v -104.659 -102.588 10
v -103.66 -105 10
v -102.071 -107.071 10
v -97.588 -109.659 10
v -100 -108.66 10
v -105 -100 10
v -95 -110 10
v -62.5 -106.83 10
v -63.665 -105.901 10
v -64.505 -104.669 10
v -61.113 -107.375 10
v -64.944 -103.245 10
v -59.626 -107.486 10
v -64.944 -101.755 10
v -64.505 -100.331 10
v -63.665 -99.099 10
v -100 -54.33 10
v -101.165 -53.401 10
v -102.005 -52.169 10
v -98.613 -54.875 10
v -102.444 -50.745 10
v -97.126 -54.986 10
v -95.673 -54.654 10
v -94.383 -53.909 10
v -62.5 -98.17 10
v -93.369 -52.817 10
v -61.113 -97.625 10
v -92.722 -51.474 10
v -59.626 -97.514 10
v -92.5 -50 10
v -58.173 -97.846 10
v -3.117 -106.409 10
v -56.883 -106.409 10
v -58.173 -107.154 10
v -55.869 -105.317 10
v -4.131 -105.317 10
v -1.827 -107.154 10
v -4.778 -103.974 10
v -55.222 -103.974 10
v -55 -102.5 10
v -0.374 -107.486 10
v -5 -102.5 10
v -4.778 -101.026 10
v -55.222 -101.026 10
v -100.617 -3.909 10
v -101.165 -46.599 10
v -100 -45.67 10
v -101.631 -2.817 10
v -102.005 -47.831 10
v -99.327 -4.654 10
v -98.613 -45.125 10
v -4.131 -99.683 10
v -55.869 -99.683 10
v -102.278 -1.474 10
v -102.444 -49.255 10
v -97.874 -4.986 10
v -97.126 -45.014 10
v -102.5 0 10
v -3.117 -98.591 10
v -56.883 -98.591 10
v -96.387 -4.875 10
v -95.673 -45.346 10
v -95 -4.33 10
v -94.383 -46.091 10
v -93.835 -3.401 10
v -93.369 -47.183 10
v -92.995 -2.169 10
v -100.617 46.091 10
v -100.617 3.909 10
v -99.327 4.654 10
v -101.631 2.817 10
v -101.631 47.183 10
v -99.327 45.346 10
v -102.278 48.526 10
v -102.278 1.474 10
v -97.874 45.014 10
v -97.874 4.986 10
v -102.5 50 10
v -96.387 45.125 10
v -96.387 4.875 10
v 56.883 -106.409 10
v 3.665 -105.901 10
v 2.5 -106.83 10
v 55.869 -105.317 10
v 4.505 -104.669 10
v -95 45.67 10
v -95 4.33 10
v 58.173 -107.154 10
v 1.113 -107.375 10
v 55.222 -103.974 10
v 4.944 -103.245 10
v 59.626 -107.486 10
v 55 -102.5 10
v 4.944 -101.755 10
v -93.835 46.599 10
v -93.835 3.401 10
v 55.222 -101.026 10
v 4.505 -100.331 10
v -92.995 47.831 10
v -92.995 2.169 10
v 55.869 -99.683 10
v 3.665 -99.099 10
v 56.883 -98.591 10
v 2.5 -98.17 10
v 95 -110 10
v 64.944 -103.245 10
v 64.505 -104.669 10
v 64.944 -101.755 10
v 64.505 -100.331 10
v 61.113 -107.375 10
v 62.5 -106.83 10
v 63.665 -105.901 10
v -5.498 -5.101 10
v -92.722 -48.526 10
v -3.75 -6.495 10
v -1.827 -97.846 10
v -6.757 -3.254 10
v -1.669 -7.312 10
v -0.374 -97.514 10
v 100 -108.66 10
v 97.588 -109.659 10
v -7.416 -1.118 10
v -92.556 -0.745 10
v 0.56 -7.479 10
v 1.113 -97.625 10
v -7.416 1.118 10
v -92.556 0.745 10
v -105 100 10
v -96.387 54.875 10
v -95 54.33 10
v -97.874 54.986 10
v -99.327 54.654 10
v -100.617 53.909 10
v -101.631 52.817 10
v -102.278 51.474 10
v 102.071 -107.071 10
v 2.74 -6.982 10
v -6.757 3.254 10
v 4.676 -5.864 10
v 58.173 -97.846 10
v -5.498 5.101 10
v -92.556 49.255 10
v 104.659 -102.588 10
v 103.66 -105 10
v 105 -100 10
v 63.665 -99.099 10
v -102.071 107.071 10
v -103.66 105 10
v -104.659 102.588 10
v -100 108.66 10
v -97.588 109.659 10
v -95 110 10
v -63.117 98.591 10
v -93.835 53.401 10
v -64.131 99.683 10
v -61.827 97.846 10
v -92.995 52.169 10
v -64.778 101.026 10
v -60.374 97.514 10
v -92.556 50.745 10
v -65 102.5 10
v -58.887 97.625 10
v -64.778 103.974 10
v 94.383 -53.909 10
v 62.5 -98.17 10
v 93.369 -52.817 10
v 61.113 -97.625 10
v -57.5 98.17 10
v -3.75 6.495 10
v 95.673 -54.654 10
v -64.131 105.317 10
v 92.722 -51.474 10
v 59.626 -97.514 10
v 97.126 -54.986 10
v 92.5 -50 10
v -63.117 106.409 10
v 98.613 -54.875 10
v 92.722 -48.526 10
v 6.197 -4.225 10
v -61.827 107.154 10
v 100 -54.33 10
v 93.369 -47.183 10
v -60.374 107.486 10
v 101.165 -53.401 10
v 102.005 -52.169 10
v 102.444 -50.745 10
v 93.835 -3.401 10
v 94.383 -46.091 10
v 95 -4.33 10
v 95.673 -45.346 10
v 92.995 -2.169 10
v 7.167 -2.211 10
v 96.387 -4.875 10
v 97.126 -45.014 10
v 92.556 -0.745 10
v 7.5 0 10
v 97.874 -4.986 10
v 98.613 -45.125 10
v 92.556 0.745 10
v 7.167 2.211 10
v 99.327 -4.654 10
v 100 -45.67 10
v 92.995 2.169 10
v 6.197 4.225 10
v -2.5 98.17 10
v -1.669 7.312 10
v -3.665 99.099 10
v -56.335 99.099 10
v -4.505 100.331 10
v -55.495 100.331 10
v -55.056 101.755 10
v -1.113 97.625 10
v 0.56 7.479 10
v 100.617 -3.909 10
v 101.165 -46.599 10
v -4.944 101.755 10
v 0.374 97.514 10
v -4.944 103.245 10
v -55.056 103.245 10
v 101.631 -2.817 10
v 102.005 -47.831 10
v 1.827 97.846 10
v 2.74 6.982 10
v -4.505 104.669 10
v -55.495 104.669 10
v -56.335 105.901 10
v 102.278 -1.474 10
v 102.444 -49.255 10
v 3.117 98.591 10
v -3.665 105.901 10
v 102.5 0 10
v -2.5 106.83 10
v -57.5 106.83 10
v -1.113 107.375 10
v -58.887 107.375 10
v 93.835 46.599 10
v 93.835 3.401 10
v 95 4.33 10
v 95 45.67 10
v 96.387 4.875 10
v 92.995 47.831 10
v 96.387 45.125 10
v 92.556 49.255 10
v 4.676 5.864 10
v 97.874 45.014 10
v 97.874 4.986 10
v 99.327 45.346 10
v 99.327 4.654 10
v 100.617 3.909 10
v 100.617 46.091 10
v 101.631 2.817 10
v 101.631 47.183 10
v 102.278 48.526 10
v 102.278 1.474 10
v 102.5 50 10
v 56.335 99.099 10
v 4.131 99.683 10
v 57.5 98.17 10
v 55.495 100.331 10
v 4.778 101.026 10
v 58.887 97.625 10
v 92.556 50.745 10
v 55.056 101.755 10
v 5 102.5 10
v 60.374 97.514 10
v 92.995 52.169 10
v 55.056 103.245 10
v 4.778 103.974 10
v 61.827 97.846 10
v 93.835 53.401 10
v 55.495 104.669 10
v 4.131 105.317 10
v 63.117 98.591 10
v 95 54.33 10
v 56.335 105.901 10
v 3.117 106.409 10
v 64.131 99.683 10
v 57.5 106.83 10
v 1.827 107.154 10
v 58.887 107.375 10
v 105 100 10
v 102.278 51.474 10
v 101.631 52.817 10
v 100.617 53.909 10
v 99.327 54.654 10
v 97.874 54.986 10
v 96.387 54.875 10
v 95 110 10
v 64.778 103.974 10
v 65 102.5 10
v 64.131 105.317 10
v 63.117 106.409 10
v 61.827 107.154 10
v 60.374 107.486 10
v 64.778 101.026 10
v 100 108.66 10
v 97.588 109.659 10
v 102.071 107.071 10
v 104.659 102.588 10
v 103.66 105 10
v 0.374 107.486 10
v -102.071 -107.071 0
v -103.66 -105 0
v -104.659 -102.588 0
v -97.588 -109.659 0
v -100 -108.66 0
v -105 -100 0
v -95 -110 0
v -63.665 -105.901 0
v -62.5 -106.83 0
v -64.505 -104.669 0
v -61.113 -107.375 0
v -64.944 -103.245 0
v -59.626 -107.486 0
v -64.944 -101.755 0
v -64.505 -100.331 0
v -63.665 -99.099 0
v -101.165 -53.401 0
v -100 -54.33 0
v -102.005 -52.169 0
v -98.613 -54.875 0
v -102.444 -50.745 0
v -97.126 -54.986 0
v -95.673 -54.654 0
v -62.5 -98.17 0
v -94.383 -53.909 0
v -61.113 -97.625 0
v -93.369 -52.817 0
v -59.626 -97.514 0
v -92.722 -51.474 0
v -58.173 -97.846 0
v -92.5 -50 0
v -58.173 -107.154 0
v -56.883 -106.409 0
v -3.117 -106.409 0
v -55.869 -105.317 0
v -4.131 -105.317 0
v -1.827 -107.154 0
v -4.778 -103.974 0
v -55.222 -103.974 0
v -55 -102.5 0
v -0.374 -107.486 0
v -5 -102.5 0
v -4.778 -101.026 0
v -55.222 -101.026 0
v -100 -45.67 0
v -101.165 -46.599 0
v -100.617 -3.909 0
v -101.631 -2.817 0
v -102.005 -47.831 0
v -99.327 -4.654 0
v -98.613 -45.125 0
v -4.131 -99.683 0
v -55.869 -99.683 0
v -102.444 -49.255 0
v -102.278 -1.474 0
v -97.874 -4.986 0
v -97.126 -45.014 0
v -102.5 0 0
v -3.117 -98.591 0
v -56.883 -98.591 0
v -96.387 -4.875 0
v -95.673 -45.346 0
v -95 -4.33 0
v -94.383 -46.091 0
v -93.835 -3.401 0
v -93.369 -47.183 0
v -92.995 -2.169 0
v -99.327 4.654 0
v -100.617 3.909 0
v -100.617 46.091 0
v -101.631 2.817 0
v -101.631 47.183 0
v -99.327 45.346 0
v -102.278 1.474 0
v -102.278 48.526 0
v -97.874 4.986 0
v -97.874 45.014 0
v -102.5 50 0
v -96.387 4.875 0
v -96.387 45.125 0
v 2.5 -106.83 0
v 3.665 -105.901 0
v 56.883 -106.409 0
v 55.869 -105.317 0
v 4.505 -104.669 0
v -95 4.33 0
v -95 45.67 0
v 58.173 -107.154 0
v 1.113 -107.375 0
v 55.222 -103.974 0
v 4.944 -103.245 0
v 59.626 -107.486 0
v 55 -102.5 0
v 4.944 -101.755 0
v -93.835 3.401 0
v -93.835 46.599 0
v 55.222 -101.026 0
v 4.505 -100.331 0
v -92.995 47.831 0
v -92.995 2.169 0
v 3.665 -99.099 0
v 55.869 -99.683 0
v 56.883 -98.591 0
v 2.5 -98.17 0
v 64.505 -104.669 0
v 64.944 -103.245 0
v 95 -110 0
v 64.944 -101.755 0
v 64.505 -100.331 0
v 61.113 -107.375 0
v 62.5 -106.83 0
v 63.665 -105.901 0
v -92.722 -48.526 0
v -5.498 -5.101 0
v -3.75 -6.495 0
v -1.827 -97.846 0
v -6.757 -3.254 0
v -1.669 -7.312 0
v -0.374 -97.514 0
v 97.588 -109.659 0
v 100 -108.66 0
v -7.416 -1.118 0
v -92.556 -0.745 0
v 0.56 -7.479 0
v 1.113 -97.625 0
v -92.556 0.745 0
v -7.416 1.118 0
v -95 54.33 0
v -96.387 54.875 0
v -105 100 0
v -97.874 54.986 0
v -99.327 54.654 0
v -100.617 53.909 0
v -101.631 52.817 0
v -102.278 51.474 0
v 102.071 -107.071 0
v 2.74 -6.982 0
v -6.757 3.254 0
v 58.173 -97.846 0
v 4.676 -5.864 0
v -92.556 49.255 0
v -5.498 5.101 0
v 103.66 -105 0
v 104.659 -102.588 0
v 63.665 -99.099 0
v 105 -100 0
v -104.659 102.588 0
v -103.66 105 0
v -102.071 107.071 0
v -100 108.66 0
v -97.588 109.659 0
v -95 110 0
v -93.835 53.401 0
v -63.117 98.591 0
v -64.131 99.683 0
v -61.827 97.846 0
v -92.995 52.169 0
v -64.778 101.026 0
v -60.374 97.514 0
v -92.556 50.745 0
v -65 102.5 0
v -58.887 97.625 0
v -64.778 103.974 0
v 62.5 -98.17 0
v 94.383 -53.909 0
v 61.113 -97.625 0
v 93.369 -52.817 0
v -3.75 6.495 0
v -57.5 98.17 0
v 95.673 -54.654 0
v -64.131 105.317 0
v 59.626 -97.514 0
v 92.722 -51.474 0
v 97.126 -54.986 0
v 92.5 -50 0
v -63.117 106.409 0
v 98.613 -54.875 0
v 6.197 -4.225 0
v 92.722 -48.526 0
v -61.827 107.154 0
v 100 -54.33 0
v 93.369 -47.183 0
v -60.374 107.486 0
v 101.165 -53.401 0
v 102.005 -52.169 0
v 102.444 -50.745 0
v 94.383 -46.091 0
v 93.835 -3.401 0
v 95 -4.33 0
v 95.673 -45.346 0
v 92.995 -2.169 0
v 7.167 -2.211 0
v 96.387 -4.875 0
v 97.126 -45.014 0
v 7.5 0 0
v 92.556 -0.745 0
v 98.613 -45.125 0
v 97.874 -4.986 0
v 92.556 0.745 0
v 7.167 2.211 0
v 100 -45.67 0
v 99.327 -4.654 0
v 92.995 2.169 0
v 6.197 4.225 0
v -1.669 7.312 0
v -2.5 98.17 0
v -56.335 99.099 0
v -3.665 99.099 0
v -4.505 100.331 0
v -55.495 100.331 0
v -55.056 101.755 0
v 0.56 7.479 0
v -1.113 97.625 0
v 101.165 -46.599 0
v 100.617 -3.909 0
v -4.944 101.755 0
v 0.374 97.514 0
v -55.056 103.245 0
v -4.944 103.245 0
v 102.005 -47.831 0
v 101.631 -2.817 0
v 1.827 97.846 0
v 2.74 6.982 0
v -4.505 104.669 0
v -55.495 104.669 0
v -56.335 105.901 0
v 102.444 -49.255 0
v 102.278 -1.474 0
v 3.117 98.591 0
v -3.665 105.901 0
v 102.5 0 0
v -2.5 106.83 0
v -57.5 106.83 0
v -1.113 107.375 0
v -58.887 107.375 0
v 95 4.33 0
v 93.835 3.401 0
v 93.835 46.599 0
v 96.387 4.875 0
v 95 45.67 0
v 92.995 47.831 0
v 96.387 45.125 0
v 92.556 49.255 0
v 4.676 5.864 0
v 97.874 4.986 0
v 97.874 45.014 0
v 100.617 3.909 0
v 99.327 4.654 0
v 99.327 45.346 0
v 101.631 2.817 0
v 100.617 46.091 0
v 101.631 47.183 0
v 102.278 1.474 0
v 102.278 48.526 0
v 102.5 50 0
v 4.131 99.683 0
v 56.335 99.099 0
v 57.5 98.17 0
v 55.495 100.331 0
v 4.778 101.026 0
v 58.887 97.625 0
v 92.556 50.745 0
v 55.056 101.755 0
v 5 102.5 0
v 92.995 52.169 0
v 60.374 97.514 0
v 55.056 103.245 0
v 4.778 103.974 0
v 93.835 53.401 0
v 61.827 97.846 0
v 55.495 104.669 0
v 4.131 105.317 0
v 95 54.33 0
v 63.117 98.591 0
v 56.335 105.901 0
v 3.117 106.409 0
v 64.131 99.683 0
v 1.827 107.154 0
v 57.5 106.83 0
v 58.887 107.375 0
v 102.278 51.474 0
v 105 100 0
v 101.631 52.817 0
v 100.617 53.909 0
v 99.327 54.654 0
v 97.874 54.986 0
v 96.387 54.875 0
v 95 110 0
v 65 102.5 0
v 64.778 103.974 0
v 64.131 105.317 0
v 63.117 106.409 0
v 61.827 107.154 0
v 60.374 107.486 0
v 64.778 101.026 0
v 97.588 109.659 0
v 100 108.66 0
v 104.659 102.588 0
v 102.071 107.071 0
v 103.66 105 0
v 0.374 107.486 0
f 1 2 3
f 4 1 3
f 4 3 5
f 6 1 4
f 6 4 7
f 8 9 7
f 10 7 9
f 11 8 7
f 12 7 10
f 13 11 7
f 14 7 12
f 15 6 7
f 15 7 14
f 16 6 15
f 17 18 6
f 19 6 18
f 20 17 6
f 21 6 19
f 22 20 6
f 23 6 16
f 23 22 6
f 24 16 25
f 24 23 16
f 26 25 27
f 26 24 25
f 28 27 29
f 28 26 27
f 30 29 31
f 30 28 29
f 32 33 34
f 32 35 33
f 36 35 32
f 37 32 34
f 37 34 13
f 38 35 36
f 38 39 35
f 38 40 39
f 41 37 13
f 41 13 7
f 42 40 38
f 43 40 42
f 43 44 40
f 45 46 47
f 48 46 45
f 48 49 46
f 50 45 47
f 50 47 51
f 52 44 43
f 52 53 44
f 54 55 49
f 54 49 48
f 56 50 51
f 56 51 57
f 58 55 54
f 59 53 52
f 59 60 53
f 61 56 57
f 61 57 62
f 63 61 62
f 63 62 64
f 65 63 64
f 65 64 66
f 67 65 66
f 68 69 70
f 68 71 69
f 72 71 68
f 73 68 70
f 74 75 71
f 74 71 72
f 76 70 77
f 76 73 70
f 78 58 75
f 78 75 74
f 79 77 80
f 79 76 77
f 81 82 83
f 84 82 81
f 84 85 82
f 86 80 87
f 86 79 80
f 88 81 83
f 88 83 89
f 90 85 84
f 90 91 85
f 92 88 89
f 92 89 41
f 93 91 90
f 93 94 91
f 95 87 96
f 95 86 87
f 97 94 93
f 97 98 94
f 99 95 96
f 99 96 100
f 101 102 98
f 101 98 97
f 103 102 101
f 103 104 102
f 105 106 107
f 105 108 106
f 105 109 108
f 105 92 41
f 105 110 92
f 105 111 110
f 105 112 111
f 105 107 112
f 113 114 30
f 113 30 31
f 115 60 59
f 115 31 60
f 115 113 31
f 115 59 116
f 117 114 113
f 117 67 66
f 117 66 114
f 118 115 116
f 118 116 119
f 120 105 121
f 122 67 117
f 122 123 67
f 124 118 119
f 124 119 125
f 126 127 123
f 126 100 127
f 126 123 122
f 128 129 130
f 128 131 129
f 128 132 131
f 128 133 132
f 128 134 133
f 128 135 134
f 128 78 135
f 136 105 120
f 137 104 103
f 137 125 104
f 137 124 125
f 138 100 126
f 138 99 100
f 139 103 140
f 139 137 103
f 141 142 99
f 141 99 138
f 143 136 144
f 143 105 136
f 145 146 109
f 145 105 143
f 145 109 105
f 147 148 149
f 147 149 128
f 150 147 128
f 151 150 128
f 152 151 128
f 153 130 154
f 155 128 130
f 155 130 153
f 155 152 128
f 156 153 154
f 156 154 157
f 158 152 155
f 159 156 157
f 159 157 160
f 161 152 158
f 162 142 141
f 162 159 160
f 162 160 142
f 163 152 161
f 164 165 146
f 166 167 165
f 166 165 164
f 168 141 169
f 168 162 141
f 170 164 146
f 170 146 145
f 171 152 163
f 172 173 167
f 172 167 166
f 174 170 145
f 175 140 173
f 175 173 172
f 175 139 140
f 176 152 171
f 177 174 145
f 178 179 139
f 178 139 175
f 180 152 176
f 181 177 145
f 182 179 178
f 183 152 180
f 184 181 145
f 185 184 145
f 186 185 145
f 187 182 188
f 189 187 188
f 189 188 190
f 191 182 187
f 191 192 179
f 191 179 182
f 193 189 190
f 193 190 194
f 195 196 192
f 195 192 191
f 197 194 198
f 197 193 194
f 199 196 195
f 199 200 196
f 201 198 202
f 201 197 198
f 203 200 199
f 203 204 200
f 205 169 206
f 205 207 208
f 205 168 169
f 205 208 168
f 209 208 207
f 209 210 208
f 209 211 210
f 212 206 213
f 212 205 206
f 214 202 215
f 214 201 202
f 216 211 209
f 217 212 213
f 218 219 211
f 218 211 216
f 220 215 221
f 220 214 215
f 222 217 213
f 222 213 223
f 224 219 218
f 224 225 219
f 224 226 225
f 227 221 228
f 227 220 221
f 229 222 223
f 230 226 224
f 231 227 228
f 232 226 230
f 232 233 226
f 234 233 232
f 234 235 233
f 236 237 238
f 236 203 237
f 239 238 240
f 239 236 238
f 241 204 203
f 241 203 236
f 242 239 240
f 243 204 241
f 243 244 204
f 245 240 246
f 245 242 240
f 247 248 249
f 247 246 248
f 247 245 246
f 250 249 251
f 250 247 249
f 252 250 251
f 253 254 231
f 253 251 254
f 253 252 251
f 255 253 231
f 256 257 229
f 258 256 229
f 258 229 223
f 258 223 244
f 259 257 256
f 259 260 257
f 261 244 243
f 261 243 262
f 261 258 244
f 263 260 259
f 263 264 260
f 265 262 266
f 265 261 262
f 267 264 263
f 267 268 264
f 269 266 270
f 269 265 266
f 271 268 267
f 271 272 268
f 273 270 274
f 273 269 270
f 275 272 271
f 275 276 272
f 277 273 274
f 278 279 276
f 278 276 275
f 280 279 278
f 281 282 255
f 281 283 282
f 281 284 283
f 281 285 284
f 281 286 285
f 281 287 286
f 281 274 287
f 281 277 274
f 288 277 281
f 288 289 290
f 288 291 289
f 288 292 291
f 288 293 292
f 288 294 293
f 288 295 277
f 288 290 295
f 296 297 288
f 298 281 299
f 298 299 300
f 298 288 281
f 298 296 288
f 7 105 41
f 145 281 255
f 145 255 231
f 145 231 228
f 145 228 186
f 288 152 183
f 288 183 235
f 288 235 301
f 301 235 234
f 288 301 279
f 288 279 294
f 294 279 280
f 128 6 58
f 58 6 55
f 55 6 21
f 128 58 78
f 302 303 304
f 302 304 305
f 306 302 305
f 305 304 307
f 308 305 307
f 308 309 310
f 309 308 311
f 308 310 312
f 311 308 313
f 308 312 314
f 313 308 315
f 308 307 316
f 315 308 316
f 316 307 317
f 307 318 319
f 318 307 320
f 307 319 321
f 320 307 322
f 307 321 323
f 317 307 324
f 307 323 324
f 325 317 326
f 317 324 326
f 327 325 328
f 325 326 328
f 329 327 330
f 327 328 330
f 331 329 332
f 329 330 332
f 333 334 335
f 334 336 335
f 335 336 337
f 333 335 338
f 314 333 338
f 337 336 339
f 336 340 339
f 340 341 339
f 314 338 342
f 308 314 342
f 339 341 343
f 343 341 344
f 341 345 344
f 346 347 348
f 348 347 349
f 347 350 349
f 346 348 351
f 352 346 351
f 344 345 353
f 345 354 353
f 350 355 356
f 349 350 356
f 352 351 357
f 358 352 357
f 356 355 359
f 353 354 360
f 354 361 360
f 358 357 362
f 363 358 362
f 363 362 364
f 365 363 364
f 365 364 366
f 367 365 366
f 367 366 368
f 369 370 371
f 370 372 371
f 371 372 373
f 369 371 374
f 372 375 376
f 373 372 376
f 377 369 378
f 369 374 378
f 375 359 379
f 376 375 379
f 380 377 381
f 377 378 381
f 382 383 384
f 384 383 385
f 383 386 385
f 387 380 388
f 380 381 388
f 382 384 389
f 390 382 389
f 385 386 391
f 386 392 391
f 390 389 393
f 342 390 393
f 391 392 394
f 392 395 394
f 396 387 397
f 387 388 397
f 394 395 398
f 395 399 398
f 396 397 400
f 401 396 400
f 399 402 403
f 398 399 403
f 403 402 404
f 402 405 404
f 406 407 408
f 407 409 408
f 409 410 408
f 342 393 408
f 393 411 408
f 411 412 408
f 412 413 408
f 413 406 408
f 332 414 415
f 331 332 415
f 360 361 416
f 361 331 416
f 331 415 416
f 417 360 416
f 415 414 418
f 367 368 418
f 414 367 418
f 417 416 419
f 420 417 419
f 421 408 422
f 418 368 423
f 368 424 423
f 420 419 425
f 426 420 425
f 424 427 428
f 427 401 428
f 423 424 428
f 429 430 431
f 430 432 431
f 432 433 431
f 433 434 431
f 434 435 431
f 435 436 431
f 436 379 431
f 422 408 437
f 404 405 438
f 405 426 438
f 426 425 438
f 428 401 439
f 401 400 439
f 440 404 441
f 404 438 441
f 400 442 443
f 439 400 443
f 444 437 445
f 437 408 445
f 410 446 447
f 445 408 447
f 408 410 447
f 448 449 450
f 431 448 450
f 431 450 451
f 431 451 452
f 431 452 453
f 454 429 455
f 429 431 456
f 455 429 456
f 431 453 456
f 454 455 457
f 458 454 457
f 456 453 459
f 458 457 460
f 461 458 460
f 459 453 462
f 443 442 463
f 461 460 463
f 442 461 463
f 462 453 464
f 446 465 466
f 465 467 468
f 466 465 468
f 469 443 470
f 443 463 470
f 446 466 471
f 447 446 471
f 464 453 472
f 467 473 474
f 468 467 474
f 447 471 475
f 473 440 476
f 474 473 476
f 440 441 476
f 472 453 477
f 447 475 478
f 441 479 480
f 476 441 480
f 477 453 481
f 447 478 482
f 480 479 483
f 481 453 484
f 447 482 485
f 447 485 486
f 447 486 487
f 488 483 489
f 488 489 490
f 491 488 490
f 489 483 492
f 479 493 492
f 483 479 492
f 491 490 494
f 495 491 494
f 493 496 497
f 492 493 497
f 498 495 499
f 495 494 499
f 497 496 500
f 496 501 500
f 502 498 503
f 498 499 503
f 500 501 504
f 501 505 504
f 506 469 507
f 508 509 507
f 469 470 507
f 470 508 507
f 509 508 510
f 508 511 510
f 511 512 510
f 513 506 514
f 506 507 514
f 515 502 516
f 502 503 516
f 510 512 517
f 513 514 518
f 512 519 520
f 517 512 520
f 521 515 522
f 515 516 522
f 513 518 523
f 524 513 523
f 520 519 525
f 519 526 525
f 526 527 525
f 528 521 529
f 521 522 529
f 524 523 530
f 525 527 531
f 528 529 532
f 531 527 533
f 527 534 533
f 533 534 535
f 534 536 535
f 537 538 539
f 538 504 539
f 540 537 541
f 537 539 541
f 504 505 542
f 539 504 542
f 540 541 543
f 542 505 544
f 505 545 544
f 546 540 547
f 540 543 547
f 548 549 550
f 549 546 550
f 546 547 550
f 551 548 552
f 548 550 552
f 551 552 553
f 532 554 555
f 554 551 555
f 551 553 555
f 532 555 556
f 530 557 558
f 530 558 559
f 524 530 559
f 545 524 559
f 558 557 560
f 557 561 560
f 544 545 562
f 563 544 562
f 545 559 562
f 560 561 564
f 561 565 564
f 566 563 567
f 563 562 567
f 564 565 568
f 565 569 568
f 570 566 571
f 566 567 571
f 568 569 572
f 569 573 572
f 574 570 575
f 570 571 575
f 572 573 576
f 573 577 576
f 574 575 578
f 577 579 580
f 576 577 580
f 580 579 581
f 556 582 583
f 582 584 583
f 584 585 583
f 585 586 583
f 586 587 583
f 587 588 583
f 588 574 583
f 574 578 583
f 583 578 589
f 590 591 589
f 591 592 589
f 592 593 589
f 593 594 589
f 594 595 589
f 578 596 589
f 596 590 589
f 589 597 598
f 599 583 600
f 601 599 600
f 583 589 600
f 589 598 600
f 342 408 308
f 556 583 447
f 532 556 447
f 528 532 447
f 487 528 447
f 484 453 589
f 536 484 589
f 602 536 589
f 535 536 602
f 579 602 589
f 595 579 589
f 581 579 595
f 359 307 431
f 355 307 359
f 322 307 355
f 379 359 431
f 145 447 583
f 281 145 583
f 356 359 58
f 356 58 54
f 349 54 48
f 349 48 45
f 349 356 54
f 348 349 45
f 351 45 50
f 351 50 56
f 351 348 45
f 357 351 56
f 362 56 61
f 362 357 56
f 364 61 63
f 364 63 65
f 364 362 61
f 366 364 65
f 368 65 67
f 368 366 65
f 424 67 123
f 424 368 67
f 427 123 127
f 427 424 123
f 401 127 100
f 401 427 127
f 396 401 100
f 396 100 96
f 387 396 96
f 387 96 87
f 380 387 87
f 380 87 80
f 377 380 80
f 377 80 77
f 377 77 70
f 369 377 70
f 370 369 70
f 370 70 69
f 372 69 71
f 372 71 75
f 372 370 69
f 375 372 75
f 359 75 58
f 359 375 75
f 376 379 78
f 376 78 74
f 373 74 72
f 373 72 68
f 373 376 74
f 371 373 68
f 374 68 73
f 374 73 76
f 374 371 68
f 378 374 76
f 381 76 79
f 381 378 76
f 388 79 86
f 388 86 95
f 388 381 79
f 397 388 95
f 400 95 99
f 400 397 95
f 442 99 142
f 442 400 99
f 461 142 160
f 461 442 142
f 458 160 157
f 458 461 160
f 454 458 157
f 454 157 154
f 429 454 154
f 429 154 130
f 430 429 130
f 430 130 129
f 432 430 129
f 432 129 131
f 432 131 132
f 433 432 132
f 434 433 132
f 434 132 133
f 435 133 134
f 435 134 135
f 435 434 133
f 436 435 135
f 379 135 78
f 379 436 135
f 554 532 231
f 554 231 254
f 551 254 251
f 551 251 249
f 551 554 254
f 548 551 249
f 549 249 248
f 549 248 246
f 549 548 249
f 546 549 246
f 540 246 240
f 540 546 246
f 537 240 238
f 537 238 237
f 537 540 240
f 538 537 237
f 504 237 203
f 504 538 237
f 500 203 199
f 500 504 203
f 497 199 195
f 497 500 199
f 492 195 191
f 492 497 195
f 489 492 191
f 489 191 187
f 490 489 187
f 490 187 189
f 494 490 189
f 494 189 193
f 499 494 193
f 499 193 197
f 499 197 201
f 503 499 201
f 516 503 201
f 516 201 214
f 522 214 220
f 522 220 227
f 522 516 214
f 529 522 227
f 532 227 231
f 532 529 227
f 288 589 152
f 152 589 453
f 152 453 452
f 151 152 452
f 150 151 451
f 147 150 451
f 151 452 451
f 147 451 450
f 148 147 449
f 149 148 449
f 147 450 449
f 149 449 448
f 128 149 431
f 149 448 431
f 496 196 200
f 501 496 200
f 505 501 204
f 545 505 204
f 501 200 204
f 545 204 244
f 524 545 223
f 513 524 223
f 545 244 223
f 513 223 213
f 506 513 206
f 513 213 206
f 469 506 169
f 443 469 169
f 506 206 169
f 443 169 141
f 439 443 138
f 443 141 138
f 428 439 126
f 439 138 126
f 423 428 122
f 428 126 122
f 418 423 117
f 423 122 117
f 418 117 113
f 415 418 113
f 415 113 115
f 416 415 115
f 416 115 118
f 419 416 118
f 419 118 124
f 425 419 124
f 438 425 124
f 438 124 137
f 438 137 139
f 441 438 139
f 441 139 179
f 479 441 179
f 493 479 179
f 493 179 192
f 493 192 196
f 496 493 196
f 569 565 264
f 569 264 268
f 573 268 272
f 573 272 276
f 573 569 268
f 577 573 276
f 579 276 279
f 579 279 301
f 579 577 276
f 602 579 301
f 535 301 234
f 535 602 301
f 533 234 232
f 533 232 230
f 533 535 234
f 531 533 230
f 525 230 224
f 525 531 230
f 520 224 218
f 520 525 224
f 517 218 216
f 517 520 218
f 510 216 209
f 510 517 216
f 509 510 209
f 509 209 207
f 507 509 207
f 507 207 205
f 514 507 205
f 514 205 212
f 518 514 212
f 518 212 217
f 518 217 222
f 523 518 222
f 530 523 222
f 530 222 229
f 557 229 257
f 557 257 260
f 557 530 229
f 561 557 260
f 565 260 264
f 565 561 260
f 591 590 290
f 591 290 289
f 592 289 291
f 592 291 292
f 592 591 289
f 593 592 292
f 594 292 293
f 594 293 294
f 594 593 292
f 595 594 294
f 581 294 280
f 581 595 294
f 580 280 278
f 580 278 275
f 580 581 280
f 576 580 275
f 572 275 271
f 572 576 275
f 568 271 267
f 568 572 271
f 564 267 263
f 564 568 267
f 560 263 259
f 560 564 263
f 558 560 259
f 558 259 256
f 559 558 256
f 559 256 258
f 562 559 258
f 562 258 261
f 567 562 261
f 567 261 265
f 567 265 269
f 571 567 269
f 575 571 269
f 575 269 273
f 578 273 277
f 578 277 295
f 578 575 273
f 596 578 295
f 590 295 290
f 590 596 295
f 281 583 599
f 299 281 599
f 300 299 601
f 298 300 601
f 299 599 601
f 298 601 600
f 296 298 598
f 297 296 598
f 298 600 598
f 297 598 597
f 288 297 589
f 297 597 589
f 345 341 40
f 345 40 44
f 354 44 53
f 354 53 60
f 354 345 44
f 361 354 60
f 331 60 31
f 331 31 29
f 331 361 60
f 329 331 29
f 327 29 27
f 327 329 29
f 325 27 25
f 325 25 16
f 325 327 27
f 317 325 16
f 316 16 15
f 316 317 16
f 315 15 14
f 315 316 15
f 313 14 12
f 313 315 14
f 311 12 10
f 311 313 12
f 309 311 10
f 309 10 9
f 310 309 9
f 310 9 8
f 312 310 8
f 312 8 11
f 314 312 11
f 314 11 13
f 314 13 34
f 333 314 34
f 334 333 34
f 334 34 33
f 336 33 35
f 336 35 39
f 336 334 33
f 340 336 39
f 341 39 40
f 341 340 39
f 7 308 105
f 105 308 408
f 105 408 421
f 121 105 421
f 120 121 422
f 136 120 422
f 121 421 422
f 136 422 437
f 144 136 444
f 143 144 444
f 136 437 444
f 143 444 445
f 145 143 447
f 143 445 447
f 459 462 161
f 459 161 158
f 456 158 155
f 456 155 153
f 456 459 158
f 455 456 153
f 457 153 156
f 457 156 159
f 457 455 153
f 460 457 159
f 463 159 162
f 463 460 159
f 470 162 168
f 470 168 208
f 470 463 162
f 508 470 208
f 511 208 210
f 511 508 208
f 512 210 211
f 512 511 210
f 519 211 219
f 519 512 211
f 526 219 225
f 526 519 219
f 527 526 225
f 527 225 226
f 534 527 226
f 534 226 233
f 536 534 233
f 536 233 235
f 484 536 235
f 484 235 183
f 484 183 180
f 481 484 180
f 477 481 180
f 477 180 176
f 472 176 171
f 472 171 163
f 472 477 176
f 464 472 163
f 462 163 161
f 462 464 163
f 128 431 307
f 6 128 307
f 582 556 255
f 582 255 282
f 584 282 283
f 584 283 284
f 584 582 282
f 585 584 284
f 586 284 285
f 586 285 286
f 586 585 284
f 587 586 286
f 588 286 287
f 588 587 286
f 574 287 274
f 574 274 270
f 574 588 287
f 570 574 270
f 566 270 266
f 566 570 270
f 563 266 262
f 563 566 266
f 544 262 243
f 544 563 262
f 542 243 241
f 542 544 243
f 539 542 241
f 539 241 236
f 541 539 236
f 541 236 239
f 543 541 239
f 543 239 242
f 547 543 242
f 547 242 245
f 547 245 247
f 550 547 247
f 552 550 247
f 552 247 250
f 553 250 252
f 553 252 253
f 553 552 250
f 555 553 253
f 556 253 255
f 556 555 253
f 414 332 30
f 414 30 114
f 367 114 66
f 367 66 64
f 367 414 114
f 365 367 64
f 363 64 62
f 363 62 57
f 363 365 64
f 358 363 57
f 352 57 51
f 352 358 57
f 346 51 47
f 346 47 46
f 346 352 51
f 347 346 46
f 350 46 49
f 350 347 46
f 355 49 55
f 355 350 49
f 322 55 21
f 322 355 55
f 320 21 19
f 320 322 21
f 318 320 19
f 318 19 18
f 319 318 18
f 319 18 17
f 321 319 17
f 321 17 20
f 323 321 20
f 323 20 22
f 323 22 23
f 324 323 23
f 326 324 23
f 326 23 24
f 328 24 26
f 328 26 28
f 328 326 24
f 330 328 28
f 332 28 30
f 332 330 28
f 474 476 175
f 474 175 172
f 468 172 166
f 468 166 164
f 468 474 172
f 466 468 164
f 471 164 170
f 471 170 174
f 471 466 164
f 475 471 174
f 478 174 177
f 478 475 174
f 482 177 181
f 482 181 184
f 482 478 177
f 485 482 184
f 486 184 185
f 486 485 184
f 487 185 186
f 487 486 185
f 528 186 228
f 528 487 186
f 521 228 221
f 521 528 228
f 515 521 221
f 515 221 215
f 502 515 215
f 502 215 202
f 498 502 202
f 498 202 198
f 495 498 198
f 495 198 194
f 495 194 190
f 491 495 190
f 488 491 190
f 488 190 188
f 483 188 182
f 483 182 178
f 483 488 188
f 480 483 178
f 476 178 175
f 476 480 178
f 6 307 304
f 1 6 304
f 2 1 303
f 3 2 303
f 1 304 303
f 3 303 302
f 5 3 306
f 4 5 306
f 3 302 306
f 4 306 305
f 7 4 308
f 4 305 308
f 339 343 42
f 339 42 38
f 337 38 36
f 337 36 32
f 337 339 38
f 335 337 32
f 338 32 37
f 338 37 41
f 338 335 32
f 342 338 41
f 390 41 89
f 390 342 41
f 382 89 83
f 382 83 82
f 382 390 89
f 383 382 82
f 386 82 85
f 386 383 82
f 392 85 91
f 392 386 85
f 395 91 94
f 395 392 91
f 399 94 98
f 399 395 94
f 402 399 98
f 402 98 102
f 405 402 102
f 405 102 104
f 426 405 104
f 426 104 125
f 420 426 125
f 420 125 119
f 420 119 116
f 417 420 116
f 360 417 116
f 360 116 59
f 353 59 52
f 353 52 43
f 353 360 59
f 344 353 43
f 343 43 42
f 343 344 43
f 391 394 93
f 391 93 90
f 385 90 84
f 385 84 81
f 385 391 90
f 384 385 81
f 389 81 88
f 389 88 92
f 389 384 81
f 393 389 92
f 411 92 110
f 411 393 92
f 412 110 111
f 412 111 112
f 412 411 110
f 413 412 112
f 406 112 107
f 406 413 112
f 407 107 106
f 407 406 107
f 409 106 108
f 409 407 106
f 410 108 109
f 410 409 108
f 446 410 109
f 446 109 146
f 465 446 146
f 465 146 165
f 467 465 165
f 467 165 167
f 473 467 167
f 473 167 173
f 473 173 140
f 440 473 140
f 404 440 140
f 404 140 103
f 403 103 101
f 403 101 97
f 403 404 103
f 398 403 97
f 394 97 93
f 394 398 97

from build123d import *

# Parameters (mm, degrees)
SKETCH_1_R          = 5
EXTRUDE_1_DEPTH     = 10
SKETCH_2_R          = 7.5
CUT_EXTRUDE_1_DEPTH = 153.397506541


with BuildPart() as part:
    # 草图1 → 凸台-拉伸1 (new body)
    with BuildSketch(Plane.XY):
        with BuildLine():
            Line((-95, -110), (95, -110))
            ThreePointArc((95, -110), (102.071067812, -107.071067812), (105, -100))
            Line((105, -100), (105, 100))
            ThreePointArc((105, 100), (102.071067812, 107.071067812), (95, 110))
            Line((95, 110), (-95, 110))
            ThreePointArc((-95, 110), (-102.071067812, 107.071067812), (-105, 100))
            Line((-105, 100), (-105, -100))
            ThreePointArc((-105, -100), (-102.071067812, -107.071067812), (-95, -110))
        make_face()
        with Locations((97.5, 0)):
            Circle(SKETCH_1_R, mode=Mode.SUBTRACT)
        with Locations((0, 102.5)):
            Circle(SKETCH_1_R, mode=Mode.SUBTRACT)
        with Locations((60, 102.5)):
            Circle(SKETCH_1_R, mode=Mode.SUBTRACT)
        with Locations((97.5, 50)):
            Circle(SKETCH_1_R, mode=Mode.SUBTRACT)
        with Locations(Location((97.5, -50, 0), (0, 0, 180))):
            Circle(SKETCH_1_R, mode=Mode.SUBTRACT)
        with Locations(Location((60, -102.5, 0), (0, 0, 180))):
            Circle(SKETCH_1_R, mode=Mode.SUBTRACT)
        with Locations(Location((0, -102.5, 0), (0, 0, 180))):
            Circle(SKETCH_1_R, mode=Mode.SUBTRACT)
        with Locations(Location((-60, 102.5, 0), (0, 0, 180))):
            Circle(SKETCH_1_R, mode=Mode.SUBTRACT)
        with Locations((-60, -102.5)):
            Circle(SKETCH_1_R, mode=Mode.SUBTRACT)
        with Locations((-97.5, -50)):
            Circle(SKETCH_1_R, mode=Mode.SUBTRACT)
        with Locations(Location((-97.5, 0, 0), (0, 0, 180))):
            Circle(SKETCH_1_R, mode=Mode.SUBTRACT)
        with Locations(Location((-97.5, 50, 0), (0, 0, 180))):
            Circle(SKETCH_1_R, mode=Mode.SUBTRACT)
    extrude(amount=EXTRUDE_1_DEPTH)

    # 草图2 → 切除-拉伸1 (cut, through all)
    with BuildSketch(Plane.XY.offset(10)):
        Circle(SKETCH_2_R)
    extrude(amount=-CUT_EXTRUDE_1_DEPTH, mode=Mode.SUBTRACT)


solid = part.part
